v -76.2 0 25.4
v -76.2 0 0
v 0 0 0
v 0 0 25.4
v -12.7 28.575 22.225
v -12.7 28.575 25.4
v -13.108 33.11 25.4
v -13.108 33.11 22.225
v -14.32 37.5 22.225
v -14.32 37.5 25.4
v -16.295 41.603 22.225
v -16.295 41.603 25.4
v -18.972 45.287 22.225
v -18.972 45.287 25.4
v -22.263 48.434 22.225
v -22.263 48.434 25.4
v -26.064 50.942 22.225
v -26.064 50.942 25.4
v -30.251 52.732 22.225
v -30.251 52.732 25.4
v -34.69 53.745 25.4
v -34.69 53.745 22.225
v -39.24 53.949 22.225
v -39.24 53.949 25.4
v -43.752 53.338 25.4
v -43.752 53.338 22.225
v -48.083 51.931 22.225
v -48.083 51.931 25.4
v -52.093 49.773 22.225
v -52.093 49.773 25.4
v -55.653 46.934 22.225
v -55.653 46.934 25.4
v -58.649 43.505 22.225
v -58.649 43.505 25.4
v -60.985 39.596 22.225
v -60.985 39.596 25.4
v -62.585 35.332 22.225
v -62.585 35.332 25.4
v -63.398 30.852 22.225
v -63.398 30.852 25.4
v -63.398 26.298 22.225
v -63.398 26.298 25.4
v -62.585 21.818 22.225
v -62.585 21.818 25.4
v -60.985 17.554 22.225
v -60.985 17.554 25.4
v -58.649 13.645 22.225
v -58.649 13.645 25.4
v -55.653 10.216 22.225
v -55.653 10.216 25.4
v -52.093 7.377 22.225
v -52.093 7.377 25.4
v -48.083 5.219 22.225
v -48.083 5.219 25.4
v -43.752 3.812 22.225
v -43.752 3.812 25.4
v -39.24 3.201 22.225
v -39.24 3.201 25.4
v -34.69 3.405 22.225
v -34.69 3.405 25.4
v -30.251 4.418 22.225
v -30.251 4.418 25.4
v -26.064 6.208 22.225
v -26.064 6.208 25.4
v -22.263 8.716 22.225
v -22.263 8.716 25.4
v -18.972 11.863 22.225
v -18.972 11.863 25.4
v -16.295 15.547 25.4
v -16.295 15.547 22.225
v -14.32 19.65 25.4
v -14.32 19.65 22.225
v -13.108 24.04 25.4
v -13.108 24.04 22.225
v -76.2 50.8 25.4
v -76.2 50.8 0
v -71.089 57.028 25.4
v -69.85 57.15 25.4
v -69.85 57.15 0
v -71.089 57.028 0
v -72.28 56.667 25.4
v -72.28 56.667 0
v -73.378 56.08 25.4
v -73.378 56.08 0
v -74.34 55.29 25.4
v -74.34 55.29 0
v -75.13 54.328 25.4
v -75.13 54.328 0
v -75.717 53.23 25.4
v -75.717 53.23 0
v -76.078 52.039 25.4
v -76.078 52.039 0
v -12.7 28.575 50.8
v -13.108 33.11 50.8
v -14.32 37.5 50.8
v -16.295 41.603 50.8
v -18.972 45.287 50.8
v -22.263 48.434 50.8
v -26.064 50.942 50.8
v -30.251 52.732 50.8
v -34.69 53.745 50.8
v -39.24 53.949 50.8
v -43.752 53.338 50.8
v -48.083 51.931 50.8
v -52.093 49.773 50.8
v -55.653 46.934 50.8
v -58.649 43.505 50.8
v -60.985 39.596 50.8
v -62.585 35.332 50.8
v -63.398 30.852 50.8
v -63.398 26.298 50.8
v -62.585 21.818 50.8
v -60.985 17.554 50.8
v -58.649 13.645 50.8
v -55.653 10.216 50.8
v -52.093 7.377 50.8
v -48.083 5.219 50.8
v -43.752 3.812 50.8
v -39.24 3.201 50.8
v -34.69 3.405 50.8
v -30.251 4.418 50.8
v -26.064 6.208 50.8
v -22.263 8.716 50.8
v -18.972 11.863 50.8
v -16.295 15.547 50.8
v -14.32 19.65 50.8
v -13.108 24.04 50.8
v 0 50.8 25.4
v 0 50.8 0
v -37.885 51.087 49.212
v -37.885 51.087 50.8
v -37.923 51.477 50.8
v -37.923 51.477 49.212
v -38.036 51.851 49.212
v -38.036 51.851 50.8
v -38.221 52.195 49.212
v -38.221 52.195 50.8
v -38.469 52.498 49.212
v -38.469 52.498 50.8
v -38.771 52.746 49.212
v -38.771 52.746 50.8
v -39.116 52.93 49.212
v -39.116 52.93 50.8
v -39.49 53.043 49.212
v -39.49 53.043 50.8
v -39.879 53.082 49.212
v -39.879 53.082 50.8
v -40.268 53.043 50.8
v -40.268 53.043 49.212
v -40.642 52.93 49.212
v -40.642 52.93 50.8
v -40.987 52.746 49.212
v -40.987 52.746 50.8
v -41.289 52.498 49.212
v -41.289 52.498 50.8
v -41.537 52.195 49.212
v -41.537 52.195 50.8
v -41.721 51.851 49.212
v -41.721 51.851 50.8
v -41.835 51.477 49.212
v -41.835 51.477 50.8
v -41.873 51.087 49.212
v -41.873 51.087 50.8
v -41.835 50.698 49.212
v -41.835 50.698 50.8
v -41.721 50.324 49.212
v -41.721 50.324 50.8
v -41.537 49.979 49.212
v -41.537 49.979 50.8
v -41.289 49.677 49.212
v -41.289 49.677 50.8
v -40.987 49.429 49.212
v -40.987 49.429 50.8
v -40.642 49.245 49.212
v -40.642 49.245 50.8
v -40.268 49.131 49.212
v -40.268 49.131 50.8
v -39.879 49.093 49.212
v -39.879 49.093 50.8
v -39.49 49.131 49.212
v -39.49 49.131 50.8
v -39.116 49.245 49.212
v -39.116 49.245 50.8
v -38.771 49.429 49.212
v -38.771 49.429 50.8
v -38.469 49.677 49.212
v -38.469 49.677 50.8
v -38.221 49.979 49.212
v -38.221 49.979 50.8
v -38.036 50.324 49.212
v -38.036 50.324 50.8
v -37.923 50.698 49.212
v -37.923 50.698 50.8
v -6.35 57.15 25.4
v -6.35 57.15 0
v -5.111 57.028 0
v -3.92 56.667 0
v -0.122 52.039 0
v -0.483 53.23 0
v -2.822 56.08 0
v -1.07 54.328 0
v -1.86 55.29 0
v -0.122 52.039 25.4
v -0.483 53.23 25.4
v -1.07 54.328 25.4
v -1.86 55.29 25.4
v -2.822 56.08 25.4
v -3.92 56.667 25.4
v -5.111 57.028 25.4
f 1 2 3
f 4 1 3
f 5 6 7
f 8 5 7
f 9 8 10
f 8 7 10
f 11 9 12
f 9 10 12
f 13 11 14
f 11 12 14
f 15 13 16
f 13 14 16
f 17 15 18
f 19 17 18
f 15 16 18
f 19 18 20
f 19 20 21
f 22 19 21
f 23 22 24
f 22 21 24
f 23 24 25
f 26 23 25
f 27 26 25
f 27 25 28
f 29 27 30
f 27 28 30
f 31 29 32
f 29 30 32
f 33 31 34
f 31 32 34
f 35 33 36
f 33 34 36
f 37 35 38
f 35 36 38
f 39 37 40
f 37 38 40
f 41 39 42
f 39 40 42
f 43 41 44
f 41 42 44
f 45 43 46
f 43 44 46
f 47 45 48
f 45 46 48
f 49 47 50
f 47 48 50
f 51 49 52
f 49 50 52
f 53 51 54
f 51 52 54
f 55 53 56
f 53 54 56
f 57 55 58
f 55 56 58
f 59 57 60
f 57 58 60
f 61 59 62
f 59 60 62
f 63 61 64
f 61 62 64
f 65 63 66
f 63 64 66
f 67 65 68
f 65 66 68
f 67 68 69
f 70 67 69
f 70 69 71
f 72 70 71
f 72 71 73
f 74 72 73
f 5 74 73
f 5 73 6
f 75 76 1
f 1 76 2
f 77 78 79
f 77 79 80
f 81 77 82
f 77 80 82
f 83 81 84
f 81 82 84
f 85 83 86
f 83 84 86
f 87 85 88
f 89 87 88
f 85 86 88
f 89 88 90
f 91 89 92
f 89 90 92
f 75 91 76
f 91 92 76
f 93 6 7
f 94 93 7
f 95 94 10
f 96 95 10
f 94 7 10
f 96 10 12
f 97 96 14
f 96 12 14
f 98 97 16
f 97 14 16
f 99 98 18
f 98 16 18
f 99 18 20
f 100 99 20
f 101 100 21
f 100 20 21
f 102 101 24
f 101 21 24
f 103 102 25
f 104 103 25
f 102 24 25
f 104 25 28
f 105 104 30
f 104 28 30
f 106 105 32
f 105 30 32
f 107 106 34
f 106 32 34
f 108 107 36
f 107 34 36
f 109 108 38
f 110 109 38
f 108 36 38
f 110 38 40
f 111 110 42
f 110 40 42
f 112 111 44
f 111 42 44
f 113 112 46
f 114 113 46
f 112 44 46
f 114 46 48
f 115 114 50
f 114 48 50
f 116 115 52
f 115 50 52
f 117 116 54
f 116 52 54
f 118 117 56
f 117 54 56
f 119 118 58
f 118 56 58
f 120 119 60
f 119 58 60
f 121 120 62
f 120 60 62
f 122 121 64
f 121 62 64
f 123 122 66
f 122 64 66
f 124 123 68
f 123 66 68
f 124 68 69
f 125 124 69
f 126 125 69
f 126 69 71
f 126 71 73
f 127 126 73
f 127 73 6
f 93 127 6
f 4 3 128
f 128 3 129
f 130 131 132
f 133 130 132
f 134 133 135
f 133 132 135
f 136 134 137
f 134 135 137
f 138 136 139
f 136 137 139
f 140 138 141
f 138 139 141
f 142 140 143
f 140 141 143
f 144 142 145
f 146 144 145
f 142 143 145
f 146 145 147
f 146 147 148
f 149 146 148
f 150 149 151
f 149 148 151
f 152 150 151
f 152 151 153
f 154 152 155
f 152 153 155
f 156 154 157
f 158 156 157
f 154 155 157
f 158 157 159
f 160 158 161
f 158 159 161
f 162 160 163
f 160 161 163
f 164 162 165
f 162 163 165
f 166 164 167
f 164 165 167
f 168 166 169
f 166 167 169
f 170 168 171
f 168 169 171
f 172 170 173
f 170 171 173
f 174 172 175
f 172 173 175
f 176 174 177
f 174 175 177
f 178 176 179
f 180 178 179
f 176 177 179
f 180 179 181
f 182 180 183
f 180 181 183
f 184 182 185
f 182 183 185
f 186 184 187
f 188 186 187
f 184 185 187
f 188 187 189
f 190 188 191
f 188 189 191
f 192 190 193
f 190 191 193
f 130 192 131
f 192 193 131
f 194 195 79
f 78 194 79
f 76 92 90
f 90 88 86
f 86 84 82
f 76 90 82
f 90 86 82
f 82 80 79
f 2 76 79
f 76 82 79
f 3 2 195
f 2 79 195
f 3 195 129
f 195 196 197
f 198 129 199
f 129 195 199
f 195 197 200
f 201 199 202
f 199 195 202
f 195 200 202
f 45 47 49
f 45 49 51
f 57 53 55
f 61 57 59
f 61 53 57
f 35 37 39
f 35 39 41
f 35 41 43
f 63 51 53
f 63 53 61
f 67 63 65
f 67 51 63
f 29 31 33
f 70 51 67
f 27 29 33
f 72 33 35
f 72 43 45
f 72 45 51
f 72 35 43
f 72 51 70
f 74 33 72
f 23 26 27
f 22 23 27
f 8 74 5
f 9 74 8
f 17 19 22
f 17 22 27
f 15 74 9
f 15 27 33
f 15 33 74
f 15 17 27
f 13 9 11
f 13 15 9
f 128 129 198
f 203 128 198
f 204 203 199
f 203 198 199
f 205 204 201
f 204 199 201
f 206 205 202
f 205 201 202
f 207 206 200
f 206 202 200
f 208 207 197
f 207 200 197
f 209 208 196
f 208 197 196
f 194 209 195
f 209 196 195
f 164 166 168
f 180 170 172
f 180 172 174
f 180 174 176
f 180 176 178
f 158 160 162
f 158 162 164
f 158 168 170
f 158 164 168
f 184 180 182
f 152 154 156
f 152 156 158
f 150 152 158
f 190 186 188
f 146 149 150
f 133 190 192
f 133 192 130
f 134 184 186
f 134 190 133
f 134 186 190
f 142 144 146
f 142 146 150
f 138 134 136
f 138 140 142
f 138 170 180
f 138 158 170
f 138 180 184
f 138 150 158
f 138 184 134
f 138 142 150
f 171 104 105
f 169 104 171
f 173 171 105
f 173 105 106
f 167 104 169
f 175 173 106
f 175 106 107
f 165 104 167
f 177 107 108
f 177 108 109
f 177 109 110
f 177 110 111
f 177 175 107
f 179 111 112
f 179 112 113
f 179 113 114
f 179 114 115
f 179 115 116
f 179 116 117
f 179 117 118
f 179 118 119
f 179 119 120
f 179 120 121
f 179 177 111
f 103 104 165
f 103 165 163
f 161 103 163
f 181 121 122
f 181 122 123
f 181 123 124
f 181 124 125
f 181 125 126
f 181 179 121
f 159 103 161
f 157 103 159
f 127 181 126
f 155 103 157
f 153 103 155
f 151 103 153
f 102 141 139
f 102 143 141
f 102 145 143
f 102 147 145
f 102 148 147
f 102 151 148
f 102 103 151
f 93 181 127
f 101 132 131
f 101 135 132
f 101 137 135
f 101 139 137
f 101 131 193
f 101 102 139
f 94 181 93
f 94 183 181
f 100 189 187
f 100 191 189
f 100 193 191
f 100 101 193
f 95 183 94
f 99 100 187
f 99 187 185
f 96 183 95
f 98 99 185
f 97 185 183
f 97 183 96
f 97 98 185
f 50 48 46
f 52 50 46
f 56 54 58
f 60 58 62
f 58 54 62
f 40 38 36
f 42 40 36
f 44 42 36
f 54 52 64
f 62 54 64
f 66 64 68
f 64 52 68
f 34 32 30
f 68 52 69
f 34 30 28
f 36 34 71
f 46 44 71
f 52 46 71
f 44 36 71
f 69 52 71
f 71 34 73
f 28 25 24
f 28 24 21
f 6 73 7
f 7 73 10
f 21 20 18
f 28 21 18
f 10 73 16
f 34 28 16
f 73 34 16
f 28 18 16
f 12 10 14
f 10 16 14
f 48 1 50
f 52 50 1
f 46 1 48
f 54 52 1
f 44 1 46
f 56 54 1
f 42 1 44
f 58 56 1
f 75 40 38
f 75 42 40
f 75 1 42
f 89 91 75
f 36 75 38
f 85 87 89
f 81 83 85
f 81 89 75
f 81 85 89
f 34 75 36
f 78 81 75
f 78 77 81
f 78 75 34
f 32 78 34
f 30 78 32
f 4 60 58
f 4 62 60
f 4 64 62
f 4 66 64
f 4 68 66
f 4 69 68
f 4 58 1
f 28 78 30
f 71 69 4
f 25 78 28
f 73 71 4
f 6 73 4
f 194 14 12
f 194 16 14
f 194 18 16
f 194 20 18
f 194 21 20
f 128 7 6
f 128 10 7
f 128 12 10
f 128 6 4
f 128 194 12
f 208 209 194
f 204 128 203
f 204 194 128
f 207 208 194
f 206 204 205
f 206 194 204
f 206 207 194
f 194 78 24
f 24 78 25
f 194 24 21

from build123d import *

# Parameters (mm, degrees)
F1_DEPTH = 25.4
F2_R     = 25.4
F3_DEPTH = 25.4
F6_DEPTH = 3.175
F7_R     = 1.9943268645
F8_DEPTH = 1.5875


# Not quite as in the source:
# - a feature of the source that left no trace in its solid (it failed there, or was rolled back) is left out


with BuildPart() as f1:
    # F0 (on Top) → F1 (new body)
    with BuildSketch(Plane.XY):
        with BuildLine():
            Line((-76.2, 0), (0, 0))
            Line((0, 0), (0, 50.8))
            ThreePointArc((0, 50.8), (-1.8598719395, 55.2901280605), (-6.35, 57.15))
            Line((-6.35, 57.15), (-69.85, 57.15))
            ThreePointArc((-69.85, 57.15), (-74.3401280605, 55.2901280605), (-76.2, 50.8))
            Line((-76.2, 50.8), (-76.2, 0))
        make_face()
    extrude(amount=F1_DEPTH)

    # F2 (on face) → F6 (cut)
    with BuildSketch(Plane.XY.offset(25.4)):
        with Locations((-38.1, 28.575)):
            Circle(F2_R)
    extrude(amount=-F6_DEPTH, mode=Mode.SUBTRACT)


with BuildPart() as f3:
    # F2 (on face) → F3 (new body)
    with BuildSketch(Plane.XY.offset(25.4)):
        with Locations((-38.1, 28.575)):
            Circle(F2_R)
    extrude(amount=F3_DEPTH)

    # F7 (on face) → F8 (cut)
    with BuildSketch(Plane.XY.offset(50.8)):
        with Locations((-39.8789197206, 51.0874353349)):
            Circle(F7_R)
    extrude(amount=-F8_DEPTH, mode=Mode.SUBTRACT)


solid = Compound([f1.part, f3.part])
